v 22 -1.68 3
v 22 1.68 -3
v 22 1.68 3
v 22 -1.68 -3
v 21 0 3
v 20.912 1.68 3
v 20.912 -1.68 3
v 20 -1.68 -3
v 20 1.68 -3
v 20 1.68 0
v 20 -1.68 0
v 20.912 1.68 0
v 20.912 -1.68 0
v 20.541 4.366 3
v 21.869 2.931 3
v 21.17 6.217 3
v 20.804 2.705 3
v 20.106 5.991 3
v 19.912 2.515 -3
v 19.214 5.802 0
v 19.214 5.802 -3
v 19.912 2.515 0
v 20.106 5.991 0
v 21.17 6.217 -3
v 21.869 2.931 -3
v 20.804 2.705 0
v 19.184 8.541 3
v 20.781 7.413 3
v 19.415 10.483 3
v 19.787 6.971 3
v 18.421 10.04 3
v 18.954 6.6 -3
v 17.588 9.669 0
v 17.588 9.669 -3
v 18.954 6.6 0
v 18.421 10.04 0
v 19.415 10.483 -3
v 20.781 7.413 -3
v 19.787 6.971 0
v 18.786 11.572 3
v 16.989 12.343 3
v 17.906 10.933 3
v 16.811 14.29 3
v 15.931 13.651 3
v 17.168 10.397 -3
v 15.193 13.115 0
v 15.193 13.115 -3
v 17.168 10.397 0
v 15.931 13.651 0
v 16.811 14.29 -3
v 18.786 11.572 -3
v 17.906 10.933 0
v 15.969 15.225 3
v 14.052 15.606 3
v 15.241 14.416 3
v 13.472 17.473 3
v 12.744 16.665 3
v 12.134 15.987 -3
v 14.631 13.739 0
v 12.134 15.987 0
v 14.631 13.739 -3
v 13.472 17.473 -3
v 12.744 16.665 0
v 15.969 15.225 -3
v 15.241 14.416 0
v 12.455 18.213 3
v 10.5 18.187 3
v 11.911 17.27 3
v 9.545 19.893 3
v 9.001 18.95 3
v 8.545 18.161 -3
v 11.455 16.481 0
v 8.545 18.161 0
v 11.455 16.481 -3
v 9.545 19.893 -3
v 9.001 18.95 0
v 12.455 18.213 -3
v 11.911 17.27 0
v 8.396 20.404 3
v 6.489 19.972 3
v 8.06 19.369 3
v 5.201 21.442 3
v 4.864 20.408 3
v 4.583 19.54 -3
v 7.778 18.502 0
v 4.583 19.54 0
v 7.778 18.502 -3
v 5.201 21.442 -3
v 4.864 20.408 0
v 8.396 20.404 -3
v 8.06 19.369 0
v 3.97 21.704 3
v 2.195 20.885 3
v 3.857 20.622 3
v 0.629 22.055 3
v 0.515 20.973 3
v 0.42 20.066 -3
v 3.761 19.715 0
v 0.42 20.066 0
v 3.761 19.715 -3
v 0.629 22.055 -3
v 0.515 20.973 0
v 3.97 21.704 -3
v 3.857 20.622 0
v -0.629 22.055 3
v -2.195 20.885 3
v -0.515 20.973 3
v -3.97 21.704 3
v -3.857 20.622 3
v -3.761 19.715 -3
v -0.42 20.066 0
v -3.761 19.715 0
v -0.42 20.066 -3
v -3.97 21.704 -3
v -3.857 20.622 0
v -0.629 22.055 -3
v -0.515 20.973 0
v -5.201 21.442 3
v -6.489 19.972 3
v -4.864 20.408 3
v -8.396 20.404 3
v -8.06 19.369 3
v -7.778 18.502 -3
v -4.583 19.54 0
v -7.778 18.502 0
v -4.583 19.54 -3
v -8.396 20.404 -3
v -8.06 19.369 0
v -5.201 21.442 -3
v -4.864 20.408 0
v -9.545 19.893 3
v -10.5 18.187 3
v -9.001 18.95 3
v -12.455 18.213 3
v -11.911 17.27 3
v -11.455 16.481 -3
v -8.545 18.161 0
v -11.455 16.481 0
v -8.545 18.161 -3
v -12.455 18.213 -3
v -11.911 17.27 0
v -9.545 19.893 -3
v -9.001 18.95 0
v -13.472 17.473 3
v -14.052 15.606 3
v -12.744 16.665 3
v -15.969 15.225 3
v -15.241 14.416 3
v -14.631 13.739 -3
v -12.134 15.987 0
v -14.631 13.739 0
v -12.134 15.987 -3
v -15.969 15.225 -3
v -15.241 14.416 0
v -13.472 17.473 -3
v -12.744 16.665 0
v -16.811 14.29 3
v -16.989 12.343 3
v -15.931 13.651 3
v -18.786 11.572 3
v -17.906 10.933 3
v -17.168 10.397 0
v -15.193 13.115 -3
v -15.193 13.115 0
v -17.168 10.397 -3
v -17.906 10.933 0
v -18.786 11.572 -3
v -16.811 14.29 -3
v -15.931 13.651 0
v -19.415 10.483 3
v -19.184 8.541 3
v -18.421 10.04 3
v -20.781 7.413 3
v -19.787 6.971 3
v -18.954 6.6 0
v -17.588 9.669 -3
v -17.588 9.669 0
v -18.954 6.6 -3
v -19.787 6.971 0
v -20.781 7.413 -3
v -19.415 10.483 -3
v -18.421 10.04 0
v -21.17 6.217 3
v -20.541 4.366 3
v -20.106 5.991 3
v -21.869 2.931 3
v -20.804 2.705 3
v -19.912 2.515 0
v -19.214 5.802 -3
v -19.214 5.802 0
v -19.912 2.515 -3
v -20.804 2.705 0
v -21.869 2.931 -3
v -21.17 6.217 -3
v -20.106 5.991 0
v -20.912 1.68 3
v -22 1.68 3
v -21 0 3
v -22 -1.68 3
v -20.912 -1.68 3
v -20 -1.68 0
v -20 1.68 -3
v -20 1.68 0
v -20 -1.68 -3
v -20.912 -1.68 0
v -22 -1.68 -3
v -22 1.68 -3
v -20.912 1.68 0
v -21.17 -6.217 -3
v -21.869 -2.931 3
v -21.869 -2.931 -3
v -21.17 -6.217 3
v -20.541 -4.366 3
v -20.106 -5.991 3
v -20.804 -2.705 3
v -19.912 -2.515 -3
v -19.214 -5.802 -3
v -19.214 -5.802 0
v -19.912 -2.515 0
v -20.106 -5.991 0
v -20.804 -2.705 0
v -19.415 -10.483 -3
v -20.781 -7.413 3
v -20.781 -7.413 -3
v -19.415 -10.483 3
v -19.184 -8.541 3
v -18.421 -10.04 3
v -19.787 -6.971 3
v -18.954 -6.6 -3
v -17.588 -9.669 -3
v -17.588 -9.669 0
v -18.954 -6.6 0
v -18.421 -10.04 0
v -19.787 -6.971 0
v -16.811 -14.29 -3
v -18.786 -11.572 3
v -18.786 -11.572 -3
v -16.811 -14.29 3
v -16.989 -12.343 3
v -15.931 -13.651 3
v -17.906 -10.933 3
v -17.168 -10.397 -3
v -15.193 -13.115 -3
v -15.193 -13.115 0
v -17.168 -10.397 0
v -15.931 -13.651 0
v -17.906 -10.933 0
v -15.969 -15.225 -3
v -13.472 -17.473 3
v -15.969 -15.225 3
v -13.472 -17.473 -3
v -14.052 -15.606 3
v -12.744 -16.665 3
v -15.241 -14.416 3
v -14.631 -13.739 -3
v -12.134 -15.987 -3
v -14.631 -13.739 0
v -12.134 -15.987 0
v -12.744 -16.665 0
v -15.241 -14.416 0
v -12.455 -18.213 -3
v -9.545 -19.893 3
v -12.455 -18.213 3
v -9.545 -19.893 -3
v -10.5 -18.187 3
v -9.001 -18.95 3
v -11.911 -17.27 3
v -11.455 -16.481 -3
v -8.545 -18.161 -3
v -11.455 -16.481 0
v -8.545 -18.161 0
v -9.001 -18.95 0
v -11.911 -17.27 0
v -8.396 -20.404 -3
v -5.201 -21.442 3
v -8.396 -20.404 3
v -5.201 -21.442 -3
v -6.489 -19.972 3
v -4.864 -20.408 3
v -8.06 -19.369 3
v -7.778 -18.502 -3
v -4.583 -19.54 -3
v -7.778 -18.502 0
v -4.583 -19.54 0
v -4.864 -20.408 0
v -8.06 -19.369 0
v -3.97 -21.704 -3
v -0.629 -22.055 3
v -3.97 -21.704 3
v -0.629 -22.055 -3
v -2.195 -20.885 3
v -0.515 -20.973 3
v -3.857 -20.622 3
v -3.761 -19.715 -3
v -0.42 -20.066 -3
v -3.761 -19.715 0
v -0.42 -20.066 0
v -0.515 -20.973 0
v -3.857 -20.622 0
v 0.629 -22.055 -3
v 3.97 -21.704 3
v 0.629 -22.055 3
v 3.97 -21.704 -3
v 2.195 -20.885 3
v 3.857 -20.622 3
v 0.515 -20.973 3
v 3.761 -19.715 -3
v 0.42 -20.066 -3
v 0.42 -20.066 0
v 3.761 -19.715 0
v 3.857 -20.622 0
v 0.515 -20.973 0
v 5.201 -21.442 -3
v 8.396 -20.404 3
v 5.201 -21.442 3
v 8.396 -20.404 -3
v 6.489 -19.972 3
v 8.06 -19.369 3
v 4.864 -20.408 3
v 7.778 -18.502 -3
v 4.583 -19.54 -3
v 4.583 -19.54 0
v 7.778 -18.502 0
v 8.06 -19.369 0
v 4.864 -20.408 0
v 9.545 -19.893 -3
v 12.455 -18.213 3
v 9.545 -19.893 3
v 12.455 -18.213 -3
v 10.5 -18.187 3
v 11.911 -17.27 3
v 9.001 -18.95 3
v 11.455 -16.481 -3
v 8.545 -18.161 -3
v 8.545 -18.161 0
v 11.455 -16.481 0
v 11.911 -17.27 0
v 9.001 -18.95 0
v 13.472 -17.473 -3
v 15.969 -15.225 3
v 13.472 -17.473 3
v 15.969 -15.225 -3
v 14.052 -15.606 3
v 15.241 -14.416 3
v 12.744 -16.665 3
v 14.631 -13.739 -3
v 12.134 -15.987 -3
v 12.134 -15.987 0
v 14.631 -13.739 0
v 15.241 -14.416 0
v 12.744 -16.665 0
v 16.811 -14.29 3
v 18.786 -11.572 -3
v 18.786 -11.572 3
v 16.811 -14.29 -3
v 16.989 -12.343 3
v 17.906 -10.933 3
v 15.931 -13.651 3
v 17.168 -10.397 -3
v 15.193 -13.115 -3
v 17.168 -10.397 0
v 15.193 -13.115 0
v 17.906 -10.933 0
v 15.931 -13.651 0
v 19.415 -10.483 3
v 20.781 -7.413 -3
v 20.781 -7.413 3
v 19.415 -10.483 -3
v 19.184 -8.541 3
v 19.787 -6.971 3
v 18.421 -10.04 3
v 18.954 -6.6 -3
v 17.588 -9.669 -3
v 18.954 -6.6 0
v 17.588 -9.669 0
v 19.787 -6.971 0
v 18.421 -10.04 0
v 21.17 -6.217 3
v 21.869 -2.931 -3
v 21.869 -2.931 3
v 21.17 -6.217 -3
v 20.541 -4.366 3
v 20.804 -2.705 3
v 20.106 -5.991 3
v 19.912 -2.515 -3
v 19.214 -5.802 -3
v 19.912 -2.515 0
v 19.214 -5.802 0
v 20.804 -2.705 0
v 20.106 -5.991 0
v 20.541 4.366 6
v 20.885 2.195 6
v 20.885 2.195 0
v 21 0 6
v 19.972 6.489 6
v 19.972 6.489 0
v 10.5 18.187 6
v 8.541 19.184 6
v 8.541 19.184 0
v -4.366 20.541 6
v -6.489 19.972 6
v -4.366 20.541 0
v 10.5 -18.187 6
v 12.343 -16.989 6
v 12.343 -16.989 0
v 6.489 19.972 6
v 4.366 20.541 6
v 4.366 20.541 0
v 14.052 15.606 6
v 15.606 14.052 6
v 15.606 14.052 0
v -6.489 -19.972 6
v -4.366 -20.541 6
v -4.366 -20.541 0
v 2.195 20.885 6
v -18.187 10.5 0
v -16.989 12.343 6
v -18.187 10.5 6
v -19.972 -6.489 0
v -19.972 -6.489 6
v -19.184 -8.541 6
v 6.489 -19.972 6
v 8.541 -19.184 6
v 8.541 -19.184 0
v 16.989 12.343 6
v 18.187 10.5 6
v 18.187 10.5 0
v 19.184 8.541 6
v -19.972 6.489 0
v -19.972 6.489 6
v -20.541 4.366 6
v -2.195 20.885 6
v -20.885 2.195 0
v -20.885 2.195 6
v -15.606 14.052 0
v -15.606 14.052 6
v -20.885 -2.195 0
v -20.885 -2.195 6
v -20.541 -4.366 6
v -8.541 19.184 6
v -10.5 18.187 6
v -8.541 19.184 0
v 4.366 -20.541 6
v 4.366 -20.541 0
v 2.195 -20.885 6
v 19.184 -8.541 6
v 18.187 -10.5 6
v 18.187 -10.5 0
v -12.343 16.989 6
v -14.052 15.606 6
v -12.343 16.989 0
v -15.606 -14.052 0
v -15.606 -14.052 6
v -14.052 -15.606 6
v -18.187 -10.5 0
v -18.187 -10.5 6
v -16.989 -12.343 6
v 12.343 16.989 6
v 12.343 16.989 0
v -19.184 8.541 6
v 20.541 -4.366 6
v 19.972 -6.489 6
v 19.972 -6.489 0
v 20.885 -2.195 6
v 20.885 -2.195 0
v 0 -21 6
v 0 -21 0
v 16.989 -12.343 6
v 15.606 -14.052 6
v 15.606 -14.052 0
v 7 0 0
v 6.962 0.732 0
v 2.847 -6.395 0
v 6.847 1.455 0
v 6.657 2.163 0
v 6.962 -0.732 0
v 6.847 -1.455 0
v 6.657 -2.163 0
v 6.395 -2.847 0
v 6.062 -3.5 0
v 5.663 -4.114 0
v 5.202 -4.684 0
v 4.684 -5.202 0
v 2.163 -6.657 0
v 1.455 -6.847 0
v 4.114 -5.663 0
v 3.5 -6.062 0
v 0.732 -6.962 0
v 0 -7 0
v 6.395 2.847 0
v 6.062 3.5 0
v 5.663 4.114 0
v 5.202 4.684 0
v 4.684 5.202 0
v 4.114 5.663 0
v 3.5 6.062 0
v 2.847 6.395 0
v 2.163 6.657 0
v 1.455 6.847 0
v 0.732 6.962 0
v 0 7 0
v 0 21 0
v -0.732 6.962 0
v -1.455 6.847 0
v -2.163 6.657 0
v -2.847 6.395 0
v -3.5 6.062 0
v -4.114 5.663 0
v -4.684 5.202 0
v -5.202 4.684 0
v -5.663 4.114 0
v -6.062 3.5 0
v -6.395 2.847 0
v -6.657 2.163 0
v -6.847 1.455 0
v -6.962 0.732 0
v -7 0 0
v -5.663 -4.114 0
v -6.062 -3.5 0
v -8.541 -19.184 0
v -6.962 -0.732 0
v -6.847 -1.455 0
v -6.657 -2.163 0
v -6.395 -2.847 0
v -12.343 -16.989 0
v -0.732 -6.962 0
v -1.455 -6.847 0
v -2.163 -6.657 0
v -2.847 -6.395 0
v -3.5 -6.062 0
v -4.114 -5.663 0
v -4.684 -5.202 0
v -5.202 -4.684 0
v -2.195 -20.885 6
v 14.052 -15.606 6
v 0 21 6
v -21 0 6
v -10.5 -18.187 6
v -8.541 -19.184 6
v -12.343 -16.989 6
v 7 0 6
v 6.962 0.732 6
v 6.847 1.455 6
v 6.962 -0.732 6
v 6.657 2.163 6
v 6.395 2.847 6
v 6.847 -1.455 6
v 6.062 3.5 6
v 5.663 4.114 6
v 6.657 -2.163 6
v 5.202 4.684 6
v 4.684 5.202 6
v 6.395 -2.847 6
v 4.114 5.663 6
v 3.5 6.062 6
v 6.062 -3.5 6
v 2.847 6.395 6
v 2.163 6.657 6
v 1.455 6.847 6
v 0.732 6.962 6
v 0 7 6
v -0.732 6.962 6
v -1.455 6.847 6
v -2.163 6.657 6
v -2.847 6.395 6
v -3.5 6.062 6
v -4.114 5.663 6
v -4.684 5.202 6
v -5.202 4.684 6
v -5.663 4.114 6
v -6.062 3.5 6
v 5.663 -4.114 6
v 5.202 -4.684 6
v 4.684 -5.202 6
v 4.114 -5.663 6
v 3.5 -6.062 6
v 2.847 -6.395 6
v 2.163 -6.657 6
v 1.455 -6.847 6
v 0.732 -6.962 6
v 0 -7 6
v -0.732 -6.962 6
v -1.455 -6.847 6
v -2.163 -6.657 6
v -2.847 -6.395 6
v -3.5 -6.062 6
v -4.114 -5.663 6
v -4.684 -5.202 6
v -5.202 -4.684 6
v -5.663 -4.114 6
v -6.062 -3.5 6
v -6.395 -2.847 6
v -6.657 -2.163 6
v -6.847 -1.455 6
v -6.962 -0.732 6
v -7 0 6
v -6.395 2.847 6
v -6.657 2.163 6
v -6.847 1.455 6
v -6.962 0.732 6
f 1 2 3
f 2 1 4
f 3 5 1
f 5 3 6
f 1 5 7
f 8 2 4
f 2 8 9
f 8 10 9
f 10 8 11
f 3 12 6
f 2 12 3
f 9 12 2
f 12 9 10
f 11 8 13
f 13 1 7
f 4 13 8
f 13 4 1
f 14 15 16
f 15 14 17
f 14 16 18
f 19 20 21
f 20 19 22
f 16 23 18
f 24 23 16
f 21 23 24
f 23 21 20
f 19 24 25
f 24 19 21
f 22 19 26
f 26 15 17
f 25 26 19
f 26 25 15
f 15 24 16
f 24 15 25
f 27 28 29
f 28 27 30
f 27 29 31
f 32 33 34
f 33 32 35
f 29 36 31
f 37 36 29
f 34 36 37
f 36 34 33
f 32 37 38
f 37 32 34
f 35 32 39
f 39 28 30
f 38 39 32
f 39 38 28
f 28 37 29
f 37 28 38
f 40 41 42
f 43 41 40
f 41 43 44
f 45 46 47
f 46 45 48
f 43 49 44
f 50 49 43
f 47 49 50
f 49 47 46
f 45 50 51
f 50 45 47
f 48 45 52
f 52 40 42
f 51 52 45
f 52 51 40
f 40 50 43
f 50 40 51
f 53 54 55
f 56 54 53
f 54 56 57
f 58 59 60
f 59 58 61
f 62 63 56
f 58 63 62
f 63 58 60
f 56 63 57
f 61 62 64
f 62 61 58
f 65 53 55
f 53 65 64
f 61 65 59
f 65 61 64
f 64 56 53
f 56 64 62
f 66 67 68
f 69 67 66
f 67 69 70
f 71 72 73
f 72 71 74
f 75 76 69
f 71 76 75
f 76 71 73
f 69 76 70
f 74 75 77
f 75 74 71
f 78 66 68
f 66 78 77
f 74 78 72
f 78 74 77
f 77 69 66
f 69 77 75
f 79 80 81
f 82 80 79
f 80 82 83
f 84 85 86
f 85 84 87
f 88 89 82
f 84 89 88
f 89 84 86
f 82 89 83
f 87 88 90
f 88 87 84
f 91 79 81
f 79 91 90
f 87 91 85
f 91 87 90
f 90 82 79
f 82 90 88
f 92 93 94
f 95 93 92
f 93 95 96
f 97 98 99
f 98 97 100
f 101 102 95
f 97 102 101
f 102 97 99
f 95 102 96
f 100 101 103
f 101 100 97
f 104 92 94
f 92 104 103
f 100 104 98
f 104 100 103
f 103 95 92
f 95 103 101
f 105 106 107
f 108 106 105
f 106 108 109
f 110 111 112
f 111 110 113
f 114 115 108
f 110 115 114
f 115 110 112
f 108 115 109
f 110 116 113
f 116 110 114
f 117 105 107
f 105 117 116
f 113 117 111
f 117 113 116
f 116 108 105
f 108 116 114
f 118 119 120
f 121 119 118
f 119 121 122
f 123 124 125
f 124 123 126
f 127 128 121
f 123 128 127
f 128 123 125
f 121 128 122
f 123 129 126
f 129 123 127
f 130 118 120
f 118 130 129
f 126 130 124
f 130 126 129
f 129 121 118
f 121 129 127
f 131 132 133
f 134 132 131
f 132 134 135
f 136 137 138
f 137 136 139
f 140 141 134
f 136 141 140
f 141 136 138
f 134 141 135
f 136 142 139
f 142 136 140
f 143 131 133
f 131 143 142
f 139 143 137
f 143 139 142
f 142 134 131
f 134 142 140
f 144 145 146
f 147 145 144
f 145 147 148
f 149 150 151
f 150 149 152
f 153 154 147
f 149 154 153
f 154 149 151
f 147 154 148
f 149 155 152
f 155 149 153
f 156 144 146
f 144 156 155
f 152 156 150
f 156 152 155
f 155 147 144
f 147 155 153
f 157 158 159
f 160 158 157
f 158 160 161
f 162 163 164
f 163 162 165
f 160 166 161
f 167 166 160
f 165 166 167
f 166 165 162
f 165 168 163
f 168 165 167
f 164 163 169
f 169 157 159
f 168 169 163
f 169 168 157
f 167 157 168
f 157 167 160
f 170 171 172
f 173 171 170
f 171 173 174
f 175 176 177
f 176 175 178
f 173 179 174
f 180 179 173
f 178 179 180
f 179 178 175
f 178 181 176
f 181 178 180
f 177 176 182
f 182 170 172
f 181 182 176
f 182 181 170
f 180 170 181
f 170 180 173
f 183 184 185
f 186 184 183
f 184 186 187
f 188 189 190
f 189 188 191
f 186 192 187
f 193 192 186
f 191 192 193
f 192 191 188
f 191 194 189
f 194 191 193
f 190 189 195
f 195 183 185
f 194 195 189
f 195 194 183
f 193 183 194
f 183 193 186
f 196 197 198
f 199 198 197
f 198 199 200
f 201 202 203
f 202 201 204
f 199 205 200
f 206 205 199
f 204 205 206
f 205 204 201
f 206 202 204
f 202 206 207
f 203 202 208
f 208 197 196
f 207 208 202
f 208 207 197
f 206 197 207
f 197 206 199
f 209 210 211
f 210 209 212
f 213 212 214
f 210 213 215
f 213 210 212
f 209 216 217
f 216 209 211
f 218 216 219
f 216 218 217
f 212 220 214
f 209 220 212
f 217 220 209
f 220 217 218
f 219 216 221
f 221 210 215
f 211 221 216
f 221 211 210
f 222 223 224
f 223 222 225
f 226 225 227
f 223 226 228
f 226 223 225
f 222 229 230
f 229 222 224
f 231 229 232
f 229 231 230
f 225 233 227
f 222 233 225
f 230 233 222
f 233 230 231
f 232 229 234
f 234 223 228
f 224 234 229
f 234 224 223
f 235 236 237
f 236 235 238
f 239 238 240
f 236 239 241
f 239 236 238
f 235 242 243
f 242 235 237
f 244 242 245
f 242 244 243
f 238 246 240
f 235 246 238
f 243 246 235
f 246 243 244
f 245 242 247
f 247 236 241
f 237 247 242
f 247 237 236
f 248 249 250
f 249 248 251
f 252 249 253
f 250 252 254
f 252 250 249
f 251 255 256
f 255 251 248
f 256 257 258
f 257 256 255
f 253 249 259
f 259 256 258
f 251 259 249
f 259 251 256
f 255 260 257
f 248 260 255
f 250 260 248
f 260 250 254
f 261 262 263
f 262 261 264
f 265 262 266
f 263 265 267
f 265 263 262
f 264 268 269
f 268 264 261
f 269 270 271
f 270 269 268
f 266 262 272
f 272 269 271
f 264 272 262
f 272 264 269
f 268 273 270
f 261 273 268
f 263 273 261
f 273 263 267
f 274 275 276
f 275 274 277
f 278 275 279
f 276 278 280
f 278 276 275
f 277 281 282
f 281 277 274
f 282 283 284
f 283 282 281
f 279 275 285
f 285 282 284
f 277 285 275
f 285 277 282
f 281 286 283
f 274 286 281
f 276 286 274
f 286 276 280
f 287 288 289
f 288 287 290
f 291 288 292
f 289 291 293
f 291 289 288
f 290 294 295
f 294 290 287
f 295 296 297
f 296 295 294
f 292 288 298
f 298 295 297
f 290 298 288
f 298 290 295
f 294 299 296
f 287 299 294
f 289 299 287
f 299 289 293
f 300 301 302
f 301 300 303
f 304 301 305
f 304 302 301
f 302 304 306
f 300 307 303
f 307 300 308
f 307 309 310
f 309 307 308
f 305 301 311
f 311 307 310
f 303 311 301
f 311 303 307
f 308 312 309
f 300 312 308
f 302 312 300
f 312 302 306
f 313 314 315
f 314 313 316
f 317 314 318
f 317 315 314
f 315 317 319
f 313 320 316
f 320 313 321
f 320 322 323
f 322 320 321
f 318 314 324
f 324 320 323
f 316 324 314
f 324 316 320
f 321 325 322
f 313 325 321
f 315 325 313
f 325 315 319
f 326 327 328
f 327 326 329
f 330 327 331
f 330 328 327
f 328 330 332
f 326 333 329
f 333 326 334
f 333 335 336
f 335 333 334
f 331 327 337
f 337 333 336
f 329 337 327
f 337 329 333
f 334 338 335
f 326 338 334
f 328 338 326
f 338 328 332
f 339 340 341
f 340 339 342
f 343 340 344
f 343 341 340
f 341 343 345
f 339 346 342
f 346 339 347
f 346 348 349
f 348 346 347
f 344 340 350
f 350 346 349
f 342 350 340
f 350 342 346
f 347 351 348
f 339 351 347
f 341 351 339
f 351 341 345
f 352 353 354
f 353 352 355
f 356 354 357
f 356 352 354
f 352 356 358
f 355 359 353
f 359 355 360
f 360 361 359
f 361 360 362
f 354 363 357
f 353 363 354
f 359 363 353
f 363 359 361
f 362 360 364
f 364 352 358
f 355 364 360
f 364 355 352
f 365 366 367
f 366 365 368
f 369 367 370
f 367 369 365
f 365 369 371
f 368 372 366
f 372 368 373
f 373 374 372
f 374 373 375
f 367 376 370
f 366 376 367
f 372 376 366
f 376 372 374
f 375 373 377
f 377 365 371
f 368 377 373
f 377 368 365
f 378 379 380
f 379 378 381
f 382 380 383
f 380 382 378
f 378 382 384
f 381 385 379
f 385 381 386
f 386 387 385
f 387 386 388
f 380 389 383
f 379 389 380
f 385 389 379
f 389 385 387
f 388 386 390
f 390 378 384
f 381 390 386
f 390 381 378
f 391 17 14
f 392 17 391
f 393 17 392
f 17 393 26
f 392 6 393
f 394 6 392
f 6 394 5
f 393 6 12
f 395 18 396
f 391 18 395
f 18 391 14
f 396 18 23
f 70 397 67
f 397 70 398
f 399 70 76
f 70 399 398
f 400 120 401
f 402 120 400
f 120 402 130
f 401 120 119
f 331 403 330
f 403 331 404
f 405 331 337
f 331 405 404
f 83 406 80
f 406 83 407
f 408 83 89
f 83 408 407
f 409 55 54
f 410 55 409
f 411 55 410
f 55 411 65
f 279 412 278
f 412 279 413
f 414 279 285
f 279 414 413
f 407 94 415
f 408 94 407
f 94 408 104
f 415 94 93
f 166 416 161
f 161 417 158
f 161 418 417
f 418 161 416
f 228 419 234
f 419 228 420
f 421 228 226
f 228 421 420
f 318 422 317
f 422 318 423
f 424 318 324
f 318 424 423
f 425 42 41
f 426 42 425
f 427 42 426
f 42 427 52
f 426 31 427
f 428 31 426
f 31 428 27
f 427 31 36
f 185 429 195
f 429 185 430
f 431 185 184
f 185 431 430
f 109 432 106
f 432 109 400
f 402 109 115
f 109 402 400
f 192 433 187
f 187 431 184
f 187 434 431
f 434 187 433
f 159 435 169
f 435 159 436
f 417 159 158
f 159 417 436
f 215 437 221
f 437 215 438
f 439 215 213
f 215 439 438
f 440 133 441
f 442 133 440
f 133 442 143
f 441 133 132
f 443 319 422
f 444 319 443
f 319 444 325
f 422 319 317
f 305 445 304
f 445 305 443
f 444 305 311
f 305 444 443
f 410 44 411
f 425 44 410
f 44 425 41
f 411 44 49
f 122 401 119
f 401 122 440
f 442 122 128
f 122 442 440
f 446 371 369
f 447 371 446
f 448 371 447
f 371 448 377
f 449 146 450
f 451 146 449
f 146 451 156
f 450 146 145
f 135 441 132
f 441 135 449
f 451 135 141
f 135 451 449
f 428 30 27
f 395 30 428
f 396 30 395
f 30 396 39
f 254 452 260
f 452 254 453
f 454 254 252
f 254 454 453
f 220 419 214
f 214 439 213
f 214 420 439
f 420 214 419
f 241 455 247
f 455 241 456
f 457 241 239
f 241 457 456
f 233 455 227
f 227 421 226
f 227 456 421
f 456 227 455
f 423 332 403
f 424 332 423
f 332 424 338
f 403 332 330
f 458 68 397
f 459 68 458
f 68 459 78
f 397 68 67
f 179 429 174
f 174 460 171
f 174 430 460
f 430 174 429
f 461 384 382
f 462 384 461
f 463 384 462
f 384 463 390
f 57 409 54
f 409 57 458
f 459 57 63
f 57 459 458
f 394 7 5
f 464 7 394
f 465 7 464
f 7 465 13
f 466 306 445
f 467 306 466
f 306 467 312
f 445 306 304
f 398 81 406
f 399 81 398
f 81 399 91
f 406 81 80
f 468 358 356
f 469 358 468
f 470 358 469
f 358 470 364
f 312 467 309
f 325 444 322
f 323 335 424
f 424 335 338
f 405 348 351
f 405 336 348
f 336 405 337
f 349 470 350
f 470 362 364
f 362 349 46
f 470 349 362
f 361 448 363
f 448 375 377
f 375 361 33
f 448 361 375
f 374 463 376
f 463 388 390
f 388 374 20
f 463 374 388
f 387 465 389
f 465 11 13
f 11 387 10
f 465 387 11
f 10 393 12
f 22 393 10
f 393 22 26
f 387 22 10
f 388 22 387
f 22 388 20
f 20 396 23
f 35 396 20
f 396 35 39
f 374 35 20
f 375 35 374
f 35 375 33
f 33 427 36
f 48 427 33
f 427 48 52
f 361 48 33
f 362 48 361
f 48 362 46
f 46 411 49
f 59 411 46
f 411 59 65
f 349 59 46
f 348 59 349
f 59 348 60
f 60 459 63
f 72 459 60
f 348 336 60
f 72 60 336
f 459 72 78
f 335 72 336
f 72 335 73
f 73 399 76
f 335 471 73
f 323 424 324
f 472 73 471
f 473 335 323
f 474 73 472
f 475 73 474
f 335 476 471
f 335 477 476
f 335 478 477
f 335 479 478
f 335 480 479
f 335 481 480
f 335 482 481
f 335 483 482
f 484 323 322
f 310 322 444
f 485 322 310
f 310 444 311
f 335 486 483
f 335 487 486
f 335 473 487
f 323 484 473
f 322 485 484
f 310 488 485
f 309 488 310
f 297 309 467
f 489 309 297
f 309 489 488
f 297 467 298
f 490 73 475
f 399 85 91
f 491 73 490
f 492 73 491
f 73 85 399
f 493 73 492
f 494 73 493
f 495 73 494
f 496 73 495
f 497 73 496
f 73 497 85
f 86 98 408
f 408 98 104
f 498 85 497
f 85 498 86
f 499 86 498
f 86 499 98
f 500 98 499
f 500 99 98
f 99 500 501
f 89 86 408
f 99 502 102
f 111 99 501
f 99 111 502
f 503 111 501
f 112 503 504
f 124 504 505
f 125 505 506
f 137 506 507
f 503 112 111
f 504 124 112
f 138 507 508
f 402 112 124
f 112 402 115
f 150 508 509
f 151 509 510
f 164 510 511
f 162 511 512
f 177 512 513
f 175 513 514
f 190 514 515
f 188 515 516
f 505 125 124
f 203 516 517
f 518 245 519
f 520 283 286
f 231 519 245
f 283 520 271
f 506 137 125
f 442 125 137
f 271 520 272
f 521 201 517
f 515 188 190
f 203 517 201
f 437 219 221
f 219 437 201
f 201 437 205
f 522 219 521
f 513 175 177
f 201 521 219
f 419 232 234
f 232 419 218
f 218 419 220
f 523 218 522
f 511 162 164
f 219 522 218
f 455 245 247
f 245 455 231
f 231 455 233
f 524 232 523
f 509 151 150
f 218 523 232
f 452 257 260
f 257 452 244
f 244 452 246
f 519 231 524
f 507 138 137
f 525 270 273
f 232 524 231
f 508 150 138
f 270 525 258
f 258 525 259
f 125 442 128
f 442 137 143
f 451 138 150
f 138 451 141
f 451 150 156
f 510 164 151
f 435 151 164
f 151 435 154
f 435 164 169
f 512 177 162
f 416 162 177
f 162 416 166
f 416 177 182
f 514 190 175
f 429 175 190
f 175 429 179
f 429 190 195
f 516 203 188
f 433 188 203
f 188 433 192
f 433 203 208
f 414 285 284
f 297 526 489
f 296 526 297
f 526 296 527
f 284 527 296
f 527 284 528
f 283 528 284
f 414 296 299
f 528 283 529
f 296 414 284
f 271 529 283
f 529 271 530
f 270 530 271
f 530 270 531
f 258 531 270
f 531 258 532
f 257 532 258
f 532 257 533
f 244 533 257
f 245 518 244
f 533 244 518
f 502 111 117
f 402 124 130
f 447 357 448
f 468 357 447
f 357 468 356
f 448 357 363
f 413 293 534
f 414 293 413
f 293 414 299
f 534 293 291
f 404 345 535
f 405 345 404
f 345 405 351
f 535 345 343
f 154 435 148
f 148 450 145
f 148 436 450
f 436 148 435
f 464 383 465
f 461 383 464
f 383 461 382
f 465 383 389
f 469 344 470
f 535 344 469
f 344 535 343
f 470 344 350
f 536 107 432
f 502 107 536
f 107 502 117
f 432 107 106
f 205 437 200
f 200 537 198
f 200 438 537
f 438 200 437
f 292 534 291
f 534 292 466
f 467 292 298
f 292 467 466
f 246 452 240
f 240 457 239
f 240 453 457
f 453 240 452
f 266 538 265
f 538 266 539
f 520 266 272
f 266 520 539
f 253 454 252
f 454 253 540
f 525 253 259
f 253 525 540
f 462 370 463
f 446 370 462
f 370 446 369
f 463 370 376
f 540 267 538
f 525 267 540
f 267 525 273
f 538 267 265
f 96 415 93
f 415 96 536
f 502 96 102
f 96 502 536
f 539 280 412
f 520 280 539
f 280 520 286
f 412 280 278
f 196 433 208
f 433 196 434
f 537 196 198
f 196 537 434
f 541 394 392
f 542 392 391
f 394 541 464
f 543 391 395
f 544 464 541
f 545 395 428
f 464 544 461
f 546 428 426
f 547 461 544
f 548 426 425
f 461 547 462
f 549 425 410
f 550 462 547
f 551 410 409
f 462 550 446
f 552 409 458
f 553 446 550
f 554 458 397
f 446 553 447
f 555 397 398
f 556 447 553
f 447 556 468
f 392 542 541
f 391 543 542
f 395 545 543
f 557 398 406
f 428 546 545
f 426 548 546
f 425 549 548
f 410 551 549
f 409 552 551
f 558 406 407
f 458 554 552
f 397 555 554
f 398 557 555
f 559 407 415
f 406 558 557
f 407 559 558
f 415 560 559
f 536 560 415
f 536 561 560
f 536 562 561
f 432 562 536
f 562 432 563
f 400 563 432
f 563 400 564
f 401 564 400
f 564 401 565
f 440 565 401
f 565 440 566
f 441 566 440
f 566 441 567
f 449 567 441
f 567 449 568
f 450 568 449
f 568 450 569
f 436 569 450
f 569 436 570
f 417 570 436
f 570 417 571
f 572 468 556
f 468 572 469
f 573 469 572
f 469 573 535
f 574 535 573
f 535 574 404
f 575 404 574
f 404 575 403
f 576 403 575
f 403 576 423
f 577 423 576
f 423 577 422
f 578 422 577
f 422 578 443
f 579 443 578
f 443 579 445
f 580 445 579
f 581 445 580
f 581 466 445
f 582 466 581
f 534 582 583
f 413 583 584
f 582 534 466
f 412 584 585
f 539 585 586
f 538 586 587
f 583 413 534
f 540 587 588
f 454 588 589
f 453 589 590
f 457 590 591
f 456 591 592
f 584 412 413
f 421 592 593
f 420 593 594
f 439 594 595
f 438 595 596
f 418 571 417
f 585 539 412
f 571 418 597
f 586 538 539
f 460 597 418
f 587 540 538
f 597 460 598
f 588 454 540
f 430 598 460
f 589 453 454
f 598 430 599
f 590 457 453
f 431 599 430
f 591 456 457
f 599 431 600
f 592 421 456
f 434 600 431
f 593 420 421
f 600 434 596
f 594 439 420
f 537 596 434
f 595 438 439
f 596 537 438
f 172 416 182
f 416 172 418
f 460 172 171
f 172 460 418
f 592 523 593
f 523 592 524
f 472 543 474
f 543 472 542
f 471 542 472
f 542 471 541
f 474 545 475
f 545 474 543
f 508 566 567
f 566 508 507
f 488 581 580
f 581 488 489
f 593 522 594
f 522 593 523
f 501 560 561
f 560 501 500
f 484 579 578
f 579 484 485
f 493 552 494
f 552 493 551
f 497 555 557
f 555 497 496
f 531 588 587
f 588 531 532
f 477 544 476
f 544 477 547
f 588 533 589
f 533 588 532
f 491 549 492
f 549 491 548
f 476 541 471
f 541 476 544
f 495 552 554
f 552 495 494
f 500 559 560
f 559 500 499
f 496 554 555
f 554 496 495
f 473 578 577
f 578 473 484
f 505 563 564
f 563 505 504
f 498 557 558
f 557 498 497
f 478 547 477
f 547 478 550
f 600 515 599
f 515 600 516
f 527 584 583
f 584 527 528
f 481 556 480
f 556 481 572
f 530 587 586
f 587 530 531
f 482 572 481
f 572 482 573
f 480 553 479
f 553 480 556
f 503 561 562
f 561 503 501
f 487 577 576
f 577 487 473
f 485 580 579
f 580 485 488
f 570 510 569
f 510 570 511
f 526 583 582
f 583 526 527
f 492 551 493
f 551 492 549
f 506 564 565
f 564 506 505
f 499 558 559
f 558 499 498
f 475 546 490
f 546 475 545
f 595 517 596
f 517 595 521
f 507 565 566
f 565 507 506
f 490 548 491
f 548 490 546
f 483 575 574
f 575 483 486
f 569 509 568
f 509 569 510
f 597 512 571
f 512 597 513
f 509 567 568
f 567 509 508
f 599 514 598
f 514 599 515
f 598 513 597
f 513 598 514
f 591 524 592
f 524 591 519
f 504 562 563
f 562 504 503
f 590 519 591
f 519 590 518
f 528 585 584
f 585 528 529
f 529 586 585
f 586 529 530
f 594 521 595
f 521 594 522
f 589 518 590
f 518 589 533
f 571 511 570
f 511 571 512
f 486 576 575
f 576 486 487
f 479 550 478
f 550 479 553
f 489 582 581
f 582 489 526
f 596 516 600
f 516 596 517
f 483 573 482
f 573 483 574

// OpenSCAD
// Gear blank with external locator teeth.
$fn = 60;
eps = 0.02;
bore_d = 14;
root_d = 42;
teeth = 30;
thickness = 6;
difference() { union() { cylinder(d=root_d,h=thickness); for(i=[0:teeth-1]) rotate([0,0,i*360/teeth]) translate([root_d/2,0,0]) cube([2,max(2,root_d*0.08),thickness],center=true); } translate([0,0,-eps]) cylinder(d=bore_d,h=thickness+2*eps); }
